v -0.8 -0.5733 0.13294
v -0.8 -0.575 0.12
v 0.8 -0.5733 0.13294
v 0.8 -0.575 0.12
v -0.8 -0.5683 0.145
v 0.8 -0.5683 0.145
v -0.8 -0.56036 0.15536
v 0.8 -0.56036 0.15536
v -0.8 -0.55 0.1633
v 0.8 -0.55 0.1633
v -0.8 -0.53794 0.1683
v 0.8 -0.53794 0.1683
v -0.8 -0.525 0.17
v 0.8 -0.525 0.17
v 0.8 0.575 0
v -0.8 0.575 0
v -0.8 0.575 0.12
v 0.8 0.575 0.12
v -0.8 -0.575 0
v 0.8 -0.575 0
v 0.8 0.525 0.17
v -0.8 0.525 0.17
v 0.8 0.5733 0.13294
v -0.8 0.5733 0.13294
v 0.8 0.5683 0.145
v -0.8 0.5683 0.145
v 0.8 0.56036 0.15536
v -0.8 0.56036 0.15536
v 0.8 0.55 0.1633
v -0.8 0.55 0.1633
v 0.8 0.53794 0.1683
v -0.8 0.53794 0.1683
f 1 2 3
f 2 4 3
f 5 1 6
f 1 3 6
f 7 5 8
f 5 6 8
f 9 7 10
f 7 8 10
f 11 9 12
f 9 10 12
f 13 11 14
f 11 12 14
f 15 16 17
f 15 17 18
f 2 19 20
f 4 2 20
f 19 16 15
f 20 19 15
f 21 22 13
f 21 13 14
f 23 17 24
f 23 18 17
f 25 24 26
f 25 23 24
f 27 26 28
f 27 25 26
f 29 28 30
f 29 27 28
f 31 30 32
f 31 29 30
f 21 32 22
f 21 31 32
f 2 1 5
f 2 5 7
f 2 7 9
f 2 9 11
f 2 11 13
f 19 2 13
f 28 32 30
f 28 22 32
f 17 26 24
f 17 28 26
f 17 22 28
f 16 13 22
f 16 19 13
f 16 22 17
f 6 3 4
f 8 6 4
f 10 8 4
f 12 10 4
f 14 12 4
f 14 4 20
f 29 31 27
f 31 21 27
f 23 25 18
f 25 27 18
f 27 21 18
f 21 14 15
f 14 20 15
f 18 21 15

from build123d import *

# Parameters (mm, degrees)
SKETCH_W  = 1.6
SKETCH_H  = 1.15
PAD_DEPTH = 0.17
FILLET_R  = 0.05


with BuildPart() as part:
    # Sketch → Pad (new body)
    with BuildSketch(Plane.XY):
        Rectangle(SKETCH_W, SKETCH_H)
    extrude(amount=PAD_DEPTH)

    # Fillet
    fillet_edges = [part.edges().sort_by_distance(p)[0] for p in [
        (0, -0.575, 0.17),
        (0, 0.575, 0.17),
    ]]
    fillet(fillet_edges, radius=FILLET_R)


solid = part.part
